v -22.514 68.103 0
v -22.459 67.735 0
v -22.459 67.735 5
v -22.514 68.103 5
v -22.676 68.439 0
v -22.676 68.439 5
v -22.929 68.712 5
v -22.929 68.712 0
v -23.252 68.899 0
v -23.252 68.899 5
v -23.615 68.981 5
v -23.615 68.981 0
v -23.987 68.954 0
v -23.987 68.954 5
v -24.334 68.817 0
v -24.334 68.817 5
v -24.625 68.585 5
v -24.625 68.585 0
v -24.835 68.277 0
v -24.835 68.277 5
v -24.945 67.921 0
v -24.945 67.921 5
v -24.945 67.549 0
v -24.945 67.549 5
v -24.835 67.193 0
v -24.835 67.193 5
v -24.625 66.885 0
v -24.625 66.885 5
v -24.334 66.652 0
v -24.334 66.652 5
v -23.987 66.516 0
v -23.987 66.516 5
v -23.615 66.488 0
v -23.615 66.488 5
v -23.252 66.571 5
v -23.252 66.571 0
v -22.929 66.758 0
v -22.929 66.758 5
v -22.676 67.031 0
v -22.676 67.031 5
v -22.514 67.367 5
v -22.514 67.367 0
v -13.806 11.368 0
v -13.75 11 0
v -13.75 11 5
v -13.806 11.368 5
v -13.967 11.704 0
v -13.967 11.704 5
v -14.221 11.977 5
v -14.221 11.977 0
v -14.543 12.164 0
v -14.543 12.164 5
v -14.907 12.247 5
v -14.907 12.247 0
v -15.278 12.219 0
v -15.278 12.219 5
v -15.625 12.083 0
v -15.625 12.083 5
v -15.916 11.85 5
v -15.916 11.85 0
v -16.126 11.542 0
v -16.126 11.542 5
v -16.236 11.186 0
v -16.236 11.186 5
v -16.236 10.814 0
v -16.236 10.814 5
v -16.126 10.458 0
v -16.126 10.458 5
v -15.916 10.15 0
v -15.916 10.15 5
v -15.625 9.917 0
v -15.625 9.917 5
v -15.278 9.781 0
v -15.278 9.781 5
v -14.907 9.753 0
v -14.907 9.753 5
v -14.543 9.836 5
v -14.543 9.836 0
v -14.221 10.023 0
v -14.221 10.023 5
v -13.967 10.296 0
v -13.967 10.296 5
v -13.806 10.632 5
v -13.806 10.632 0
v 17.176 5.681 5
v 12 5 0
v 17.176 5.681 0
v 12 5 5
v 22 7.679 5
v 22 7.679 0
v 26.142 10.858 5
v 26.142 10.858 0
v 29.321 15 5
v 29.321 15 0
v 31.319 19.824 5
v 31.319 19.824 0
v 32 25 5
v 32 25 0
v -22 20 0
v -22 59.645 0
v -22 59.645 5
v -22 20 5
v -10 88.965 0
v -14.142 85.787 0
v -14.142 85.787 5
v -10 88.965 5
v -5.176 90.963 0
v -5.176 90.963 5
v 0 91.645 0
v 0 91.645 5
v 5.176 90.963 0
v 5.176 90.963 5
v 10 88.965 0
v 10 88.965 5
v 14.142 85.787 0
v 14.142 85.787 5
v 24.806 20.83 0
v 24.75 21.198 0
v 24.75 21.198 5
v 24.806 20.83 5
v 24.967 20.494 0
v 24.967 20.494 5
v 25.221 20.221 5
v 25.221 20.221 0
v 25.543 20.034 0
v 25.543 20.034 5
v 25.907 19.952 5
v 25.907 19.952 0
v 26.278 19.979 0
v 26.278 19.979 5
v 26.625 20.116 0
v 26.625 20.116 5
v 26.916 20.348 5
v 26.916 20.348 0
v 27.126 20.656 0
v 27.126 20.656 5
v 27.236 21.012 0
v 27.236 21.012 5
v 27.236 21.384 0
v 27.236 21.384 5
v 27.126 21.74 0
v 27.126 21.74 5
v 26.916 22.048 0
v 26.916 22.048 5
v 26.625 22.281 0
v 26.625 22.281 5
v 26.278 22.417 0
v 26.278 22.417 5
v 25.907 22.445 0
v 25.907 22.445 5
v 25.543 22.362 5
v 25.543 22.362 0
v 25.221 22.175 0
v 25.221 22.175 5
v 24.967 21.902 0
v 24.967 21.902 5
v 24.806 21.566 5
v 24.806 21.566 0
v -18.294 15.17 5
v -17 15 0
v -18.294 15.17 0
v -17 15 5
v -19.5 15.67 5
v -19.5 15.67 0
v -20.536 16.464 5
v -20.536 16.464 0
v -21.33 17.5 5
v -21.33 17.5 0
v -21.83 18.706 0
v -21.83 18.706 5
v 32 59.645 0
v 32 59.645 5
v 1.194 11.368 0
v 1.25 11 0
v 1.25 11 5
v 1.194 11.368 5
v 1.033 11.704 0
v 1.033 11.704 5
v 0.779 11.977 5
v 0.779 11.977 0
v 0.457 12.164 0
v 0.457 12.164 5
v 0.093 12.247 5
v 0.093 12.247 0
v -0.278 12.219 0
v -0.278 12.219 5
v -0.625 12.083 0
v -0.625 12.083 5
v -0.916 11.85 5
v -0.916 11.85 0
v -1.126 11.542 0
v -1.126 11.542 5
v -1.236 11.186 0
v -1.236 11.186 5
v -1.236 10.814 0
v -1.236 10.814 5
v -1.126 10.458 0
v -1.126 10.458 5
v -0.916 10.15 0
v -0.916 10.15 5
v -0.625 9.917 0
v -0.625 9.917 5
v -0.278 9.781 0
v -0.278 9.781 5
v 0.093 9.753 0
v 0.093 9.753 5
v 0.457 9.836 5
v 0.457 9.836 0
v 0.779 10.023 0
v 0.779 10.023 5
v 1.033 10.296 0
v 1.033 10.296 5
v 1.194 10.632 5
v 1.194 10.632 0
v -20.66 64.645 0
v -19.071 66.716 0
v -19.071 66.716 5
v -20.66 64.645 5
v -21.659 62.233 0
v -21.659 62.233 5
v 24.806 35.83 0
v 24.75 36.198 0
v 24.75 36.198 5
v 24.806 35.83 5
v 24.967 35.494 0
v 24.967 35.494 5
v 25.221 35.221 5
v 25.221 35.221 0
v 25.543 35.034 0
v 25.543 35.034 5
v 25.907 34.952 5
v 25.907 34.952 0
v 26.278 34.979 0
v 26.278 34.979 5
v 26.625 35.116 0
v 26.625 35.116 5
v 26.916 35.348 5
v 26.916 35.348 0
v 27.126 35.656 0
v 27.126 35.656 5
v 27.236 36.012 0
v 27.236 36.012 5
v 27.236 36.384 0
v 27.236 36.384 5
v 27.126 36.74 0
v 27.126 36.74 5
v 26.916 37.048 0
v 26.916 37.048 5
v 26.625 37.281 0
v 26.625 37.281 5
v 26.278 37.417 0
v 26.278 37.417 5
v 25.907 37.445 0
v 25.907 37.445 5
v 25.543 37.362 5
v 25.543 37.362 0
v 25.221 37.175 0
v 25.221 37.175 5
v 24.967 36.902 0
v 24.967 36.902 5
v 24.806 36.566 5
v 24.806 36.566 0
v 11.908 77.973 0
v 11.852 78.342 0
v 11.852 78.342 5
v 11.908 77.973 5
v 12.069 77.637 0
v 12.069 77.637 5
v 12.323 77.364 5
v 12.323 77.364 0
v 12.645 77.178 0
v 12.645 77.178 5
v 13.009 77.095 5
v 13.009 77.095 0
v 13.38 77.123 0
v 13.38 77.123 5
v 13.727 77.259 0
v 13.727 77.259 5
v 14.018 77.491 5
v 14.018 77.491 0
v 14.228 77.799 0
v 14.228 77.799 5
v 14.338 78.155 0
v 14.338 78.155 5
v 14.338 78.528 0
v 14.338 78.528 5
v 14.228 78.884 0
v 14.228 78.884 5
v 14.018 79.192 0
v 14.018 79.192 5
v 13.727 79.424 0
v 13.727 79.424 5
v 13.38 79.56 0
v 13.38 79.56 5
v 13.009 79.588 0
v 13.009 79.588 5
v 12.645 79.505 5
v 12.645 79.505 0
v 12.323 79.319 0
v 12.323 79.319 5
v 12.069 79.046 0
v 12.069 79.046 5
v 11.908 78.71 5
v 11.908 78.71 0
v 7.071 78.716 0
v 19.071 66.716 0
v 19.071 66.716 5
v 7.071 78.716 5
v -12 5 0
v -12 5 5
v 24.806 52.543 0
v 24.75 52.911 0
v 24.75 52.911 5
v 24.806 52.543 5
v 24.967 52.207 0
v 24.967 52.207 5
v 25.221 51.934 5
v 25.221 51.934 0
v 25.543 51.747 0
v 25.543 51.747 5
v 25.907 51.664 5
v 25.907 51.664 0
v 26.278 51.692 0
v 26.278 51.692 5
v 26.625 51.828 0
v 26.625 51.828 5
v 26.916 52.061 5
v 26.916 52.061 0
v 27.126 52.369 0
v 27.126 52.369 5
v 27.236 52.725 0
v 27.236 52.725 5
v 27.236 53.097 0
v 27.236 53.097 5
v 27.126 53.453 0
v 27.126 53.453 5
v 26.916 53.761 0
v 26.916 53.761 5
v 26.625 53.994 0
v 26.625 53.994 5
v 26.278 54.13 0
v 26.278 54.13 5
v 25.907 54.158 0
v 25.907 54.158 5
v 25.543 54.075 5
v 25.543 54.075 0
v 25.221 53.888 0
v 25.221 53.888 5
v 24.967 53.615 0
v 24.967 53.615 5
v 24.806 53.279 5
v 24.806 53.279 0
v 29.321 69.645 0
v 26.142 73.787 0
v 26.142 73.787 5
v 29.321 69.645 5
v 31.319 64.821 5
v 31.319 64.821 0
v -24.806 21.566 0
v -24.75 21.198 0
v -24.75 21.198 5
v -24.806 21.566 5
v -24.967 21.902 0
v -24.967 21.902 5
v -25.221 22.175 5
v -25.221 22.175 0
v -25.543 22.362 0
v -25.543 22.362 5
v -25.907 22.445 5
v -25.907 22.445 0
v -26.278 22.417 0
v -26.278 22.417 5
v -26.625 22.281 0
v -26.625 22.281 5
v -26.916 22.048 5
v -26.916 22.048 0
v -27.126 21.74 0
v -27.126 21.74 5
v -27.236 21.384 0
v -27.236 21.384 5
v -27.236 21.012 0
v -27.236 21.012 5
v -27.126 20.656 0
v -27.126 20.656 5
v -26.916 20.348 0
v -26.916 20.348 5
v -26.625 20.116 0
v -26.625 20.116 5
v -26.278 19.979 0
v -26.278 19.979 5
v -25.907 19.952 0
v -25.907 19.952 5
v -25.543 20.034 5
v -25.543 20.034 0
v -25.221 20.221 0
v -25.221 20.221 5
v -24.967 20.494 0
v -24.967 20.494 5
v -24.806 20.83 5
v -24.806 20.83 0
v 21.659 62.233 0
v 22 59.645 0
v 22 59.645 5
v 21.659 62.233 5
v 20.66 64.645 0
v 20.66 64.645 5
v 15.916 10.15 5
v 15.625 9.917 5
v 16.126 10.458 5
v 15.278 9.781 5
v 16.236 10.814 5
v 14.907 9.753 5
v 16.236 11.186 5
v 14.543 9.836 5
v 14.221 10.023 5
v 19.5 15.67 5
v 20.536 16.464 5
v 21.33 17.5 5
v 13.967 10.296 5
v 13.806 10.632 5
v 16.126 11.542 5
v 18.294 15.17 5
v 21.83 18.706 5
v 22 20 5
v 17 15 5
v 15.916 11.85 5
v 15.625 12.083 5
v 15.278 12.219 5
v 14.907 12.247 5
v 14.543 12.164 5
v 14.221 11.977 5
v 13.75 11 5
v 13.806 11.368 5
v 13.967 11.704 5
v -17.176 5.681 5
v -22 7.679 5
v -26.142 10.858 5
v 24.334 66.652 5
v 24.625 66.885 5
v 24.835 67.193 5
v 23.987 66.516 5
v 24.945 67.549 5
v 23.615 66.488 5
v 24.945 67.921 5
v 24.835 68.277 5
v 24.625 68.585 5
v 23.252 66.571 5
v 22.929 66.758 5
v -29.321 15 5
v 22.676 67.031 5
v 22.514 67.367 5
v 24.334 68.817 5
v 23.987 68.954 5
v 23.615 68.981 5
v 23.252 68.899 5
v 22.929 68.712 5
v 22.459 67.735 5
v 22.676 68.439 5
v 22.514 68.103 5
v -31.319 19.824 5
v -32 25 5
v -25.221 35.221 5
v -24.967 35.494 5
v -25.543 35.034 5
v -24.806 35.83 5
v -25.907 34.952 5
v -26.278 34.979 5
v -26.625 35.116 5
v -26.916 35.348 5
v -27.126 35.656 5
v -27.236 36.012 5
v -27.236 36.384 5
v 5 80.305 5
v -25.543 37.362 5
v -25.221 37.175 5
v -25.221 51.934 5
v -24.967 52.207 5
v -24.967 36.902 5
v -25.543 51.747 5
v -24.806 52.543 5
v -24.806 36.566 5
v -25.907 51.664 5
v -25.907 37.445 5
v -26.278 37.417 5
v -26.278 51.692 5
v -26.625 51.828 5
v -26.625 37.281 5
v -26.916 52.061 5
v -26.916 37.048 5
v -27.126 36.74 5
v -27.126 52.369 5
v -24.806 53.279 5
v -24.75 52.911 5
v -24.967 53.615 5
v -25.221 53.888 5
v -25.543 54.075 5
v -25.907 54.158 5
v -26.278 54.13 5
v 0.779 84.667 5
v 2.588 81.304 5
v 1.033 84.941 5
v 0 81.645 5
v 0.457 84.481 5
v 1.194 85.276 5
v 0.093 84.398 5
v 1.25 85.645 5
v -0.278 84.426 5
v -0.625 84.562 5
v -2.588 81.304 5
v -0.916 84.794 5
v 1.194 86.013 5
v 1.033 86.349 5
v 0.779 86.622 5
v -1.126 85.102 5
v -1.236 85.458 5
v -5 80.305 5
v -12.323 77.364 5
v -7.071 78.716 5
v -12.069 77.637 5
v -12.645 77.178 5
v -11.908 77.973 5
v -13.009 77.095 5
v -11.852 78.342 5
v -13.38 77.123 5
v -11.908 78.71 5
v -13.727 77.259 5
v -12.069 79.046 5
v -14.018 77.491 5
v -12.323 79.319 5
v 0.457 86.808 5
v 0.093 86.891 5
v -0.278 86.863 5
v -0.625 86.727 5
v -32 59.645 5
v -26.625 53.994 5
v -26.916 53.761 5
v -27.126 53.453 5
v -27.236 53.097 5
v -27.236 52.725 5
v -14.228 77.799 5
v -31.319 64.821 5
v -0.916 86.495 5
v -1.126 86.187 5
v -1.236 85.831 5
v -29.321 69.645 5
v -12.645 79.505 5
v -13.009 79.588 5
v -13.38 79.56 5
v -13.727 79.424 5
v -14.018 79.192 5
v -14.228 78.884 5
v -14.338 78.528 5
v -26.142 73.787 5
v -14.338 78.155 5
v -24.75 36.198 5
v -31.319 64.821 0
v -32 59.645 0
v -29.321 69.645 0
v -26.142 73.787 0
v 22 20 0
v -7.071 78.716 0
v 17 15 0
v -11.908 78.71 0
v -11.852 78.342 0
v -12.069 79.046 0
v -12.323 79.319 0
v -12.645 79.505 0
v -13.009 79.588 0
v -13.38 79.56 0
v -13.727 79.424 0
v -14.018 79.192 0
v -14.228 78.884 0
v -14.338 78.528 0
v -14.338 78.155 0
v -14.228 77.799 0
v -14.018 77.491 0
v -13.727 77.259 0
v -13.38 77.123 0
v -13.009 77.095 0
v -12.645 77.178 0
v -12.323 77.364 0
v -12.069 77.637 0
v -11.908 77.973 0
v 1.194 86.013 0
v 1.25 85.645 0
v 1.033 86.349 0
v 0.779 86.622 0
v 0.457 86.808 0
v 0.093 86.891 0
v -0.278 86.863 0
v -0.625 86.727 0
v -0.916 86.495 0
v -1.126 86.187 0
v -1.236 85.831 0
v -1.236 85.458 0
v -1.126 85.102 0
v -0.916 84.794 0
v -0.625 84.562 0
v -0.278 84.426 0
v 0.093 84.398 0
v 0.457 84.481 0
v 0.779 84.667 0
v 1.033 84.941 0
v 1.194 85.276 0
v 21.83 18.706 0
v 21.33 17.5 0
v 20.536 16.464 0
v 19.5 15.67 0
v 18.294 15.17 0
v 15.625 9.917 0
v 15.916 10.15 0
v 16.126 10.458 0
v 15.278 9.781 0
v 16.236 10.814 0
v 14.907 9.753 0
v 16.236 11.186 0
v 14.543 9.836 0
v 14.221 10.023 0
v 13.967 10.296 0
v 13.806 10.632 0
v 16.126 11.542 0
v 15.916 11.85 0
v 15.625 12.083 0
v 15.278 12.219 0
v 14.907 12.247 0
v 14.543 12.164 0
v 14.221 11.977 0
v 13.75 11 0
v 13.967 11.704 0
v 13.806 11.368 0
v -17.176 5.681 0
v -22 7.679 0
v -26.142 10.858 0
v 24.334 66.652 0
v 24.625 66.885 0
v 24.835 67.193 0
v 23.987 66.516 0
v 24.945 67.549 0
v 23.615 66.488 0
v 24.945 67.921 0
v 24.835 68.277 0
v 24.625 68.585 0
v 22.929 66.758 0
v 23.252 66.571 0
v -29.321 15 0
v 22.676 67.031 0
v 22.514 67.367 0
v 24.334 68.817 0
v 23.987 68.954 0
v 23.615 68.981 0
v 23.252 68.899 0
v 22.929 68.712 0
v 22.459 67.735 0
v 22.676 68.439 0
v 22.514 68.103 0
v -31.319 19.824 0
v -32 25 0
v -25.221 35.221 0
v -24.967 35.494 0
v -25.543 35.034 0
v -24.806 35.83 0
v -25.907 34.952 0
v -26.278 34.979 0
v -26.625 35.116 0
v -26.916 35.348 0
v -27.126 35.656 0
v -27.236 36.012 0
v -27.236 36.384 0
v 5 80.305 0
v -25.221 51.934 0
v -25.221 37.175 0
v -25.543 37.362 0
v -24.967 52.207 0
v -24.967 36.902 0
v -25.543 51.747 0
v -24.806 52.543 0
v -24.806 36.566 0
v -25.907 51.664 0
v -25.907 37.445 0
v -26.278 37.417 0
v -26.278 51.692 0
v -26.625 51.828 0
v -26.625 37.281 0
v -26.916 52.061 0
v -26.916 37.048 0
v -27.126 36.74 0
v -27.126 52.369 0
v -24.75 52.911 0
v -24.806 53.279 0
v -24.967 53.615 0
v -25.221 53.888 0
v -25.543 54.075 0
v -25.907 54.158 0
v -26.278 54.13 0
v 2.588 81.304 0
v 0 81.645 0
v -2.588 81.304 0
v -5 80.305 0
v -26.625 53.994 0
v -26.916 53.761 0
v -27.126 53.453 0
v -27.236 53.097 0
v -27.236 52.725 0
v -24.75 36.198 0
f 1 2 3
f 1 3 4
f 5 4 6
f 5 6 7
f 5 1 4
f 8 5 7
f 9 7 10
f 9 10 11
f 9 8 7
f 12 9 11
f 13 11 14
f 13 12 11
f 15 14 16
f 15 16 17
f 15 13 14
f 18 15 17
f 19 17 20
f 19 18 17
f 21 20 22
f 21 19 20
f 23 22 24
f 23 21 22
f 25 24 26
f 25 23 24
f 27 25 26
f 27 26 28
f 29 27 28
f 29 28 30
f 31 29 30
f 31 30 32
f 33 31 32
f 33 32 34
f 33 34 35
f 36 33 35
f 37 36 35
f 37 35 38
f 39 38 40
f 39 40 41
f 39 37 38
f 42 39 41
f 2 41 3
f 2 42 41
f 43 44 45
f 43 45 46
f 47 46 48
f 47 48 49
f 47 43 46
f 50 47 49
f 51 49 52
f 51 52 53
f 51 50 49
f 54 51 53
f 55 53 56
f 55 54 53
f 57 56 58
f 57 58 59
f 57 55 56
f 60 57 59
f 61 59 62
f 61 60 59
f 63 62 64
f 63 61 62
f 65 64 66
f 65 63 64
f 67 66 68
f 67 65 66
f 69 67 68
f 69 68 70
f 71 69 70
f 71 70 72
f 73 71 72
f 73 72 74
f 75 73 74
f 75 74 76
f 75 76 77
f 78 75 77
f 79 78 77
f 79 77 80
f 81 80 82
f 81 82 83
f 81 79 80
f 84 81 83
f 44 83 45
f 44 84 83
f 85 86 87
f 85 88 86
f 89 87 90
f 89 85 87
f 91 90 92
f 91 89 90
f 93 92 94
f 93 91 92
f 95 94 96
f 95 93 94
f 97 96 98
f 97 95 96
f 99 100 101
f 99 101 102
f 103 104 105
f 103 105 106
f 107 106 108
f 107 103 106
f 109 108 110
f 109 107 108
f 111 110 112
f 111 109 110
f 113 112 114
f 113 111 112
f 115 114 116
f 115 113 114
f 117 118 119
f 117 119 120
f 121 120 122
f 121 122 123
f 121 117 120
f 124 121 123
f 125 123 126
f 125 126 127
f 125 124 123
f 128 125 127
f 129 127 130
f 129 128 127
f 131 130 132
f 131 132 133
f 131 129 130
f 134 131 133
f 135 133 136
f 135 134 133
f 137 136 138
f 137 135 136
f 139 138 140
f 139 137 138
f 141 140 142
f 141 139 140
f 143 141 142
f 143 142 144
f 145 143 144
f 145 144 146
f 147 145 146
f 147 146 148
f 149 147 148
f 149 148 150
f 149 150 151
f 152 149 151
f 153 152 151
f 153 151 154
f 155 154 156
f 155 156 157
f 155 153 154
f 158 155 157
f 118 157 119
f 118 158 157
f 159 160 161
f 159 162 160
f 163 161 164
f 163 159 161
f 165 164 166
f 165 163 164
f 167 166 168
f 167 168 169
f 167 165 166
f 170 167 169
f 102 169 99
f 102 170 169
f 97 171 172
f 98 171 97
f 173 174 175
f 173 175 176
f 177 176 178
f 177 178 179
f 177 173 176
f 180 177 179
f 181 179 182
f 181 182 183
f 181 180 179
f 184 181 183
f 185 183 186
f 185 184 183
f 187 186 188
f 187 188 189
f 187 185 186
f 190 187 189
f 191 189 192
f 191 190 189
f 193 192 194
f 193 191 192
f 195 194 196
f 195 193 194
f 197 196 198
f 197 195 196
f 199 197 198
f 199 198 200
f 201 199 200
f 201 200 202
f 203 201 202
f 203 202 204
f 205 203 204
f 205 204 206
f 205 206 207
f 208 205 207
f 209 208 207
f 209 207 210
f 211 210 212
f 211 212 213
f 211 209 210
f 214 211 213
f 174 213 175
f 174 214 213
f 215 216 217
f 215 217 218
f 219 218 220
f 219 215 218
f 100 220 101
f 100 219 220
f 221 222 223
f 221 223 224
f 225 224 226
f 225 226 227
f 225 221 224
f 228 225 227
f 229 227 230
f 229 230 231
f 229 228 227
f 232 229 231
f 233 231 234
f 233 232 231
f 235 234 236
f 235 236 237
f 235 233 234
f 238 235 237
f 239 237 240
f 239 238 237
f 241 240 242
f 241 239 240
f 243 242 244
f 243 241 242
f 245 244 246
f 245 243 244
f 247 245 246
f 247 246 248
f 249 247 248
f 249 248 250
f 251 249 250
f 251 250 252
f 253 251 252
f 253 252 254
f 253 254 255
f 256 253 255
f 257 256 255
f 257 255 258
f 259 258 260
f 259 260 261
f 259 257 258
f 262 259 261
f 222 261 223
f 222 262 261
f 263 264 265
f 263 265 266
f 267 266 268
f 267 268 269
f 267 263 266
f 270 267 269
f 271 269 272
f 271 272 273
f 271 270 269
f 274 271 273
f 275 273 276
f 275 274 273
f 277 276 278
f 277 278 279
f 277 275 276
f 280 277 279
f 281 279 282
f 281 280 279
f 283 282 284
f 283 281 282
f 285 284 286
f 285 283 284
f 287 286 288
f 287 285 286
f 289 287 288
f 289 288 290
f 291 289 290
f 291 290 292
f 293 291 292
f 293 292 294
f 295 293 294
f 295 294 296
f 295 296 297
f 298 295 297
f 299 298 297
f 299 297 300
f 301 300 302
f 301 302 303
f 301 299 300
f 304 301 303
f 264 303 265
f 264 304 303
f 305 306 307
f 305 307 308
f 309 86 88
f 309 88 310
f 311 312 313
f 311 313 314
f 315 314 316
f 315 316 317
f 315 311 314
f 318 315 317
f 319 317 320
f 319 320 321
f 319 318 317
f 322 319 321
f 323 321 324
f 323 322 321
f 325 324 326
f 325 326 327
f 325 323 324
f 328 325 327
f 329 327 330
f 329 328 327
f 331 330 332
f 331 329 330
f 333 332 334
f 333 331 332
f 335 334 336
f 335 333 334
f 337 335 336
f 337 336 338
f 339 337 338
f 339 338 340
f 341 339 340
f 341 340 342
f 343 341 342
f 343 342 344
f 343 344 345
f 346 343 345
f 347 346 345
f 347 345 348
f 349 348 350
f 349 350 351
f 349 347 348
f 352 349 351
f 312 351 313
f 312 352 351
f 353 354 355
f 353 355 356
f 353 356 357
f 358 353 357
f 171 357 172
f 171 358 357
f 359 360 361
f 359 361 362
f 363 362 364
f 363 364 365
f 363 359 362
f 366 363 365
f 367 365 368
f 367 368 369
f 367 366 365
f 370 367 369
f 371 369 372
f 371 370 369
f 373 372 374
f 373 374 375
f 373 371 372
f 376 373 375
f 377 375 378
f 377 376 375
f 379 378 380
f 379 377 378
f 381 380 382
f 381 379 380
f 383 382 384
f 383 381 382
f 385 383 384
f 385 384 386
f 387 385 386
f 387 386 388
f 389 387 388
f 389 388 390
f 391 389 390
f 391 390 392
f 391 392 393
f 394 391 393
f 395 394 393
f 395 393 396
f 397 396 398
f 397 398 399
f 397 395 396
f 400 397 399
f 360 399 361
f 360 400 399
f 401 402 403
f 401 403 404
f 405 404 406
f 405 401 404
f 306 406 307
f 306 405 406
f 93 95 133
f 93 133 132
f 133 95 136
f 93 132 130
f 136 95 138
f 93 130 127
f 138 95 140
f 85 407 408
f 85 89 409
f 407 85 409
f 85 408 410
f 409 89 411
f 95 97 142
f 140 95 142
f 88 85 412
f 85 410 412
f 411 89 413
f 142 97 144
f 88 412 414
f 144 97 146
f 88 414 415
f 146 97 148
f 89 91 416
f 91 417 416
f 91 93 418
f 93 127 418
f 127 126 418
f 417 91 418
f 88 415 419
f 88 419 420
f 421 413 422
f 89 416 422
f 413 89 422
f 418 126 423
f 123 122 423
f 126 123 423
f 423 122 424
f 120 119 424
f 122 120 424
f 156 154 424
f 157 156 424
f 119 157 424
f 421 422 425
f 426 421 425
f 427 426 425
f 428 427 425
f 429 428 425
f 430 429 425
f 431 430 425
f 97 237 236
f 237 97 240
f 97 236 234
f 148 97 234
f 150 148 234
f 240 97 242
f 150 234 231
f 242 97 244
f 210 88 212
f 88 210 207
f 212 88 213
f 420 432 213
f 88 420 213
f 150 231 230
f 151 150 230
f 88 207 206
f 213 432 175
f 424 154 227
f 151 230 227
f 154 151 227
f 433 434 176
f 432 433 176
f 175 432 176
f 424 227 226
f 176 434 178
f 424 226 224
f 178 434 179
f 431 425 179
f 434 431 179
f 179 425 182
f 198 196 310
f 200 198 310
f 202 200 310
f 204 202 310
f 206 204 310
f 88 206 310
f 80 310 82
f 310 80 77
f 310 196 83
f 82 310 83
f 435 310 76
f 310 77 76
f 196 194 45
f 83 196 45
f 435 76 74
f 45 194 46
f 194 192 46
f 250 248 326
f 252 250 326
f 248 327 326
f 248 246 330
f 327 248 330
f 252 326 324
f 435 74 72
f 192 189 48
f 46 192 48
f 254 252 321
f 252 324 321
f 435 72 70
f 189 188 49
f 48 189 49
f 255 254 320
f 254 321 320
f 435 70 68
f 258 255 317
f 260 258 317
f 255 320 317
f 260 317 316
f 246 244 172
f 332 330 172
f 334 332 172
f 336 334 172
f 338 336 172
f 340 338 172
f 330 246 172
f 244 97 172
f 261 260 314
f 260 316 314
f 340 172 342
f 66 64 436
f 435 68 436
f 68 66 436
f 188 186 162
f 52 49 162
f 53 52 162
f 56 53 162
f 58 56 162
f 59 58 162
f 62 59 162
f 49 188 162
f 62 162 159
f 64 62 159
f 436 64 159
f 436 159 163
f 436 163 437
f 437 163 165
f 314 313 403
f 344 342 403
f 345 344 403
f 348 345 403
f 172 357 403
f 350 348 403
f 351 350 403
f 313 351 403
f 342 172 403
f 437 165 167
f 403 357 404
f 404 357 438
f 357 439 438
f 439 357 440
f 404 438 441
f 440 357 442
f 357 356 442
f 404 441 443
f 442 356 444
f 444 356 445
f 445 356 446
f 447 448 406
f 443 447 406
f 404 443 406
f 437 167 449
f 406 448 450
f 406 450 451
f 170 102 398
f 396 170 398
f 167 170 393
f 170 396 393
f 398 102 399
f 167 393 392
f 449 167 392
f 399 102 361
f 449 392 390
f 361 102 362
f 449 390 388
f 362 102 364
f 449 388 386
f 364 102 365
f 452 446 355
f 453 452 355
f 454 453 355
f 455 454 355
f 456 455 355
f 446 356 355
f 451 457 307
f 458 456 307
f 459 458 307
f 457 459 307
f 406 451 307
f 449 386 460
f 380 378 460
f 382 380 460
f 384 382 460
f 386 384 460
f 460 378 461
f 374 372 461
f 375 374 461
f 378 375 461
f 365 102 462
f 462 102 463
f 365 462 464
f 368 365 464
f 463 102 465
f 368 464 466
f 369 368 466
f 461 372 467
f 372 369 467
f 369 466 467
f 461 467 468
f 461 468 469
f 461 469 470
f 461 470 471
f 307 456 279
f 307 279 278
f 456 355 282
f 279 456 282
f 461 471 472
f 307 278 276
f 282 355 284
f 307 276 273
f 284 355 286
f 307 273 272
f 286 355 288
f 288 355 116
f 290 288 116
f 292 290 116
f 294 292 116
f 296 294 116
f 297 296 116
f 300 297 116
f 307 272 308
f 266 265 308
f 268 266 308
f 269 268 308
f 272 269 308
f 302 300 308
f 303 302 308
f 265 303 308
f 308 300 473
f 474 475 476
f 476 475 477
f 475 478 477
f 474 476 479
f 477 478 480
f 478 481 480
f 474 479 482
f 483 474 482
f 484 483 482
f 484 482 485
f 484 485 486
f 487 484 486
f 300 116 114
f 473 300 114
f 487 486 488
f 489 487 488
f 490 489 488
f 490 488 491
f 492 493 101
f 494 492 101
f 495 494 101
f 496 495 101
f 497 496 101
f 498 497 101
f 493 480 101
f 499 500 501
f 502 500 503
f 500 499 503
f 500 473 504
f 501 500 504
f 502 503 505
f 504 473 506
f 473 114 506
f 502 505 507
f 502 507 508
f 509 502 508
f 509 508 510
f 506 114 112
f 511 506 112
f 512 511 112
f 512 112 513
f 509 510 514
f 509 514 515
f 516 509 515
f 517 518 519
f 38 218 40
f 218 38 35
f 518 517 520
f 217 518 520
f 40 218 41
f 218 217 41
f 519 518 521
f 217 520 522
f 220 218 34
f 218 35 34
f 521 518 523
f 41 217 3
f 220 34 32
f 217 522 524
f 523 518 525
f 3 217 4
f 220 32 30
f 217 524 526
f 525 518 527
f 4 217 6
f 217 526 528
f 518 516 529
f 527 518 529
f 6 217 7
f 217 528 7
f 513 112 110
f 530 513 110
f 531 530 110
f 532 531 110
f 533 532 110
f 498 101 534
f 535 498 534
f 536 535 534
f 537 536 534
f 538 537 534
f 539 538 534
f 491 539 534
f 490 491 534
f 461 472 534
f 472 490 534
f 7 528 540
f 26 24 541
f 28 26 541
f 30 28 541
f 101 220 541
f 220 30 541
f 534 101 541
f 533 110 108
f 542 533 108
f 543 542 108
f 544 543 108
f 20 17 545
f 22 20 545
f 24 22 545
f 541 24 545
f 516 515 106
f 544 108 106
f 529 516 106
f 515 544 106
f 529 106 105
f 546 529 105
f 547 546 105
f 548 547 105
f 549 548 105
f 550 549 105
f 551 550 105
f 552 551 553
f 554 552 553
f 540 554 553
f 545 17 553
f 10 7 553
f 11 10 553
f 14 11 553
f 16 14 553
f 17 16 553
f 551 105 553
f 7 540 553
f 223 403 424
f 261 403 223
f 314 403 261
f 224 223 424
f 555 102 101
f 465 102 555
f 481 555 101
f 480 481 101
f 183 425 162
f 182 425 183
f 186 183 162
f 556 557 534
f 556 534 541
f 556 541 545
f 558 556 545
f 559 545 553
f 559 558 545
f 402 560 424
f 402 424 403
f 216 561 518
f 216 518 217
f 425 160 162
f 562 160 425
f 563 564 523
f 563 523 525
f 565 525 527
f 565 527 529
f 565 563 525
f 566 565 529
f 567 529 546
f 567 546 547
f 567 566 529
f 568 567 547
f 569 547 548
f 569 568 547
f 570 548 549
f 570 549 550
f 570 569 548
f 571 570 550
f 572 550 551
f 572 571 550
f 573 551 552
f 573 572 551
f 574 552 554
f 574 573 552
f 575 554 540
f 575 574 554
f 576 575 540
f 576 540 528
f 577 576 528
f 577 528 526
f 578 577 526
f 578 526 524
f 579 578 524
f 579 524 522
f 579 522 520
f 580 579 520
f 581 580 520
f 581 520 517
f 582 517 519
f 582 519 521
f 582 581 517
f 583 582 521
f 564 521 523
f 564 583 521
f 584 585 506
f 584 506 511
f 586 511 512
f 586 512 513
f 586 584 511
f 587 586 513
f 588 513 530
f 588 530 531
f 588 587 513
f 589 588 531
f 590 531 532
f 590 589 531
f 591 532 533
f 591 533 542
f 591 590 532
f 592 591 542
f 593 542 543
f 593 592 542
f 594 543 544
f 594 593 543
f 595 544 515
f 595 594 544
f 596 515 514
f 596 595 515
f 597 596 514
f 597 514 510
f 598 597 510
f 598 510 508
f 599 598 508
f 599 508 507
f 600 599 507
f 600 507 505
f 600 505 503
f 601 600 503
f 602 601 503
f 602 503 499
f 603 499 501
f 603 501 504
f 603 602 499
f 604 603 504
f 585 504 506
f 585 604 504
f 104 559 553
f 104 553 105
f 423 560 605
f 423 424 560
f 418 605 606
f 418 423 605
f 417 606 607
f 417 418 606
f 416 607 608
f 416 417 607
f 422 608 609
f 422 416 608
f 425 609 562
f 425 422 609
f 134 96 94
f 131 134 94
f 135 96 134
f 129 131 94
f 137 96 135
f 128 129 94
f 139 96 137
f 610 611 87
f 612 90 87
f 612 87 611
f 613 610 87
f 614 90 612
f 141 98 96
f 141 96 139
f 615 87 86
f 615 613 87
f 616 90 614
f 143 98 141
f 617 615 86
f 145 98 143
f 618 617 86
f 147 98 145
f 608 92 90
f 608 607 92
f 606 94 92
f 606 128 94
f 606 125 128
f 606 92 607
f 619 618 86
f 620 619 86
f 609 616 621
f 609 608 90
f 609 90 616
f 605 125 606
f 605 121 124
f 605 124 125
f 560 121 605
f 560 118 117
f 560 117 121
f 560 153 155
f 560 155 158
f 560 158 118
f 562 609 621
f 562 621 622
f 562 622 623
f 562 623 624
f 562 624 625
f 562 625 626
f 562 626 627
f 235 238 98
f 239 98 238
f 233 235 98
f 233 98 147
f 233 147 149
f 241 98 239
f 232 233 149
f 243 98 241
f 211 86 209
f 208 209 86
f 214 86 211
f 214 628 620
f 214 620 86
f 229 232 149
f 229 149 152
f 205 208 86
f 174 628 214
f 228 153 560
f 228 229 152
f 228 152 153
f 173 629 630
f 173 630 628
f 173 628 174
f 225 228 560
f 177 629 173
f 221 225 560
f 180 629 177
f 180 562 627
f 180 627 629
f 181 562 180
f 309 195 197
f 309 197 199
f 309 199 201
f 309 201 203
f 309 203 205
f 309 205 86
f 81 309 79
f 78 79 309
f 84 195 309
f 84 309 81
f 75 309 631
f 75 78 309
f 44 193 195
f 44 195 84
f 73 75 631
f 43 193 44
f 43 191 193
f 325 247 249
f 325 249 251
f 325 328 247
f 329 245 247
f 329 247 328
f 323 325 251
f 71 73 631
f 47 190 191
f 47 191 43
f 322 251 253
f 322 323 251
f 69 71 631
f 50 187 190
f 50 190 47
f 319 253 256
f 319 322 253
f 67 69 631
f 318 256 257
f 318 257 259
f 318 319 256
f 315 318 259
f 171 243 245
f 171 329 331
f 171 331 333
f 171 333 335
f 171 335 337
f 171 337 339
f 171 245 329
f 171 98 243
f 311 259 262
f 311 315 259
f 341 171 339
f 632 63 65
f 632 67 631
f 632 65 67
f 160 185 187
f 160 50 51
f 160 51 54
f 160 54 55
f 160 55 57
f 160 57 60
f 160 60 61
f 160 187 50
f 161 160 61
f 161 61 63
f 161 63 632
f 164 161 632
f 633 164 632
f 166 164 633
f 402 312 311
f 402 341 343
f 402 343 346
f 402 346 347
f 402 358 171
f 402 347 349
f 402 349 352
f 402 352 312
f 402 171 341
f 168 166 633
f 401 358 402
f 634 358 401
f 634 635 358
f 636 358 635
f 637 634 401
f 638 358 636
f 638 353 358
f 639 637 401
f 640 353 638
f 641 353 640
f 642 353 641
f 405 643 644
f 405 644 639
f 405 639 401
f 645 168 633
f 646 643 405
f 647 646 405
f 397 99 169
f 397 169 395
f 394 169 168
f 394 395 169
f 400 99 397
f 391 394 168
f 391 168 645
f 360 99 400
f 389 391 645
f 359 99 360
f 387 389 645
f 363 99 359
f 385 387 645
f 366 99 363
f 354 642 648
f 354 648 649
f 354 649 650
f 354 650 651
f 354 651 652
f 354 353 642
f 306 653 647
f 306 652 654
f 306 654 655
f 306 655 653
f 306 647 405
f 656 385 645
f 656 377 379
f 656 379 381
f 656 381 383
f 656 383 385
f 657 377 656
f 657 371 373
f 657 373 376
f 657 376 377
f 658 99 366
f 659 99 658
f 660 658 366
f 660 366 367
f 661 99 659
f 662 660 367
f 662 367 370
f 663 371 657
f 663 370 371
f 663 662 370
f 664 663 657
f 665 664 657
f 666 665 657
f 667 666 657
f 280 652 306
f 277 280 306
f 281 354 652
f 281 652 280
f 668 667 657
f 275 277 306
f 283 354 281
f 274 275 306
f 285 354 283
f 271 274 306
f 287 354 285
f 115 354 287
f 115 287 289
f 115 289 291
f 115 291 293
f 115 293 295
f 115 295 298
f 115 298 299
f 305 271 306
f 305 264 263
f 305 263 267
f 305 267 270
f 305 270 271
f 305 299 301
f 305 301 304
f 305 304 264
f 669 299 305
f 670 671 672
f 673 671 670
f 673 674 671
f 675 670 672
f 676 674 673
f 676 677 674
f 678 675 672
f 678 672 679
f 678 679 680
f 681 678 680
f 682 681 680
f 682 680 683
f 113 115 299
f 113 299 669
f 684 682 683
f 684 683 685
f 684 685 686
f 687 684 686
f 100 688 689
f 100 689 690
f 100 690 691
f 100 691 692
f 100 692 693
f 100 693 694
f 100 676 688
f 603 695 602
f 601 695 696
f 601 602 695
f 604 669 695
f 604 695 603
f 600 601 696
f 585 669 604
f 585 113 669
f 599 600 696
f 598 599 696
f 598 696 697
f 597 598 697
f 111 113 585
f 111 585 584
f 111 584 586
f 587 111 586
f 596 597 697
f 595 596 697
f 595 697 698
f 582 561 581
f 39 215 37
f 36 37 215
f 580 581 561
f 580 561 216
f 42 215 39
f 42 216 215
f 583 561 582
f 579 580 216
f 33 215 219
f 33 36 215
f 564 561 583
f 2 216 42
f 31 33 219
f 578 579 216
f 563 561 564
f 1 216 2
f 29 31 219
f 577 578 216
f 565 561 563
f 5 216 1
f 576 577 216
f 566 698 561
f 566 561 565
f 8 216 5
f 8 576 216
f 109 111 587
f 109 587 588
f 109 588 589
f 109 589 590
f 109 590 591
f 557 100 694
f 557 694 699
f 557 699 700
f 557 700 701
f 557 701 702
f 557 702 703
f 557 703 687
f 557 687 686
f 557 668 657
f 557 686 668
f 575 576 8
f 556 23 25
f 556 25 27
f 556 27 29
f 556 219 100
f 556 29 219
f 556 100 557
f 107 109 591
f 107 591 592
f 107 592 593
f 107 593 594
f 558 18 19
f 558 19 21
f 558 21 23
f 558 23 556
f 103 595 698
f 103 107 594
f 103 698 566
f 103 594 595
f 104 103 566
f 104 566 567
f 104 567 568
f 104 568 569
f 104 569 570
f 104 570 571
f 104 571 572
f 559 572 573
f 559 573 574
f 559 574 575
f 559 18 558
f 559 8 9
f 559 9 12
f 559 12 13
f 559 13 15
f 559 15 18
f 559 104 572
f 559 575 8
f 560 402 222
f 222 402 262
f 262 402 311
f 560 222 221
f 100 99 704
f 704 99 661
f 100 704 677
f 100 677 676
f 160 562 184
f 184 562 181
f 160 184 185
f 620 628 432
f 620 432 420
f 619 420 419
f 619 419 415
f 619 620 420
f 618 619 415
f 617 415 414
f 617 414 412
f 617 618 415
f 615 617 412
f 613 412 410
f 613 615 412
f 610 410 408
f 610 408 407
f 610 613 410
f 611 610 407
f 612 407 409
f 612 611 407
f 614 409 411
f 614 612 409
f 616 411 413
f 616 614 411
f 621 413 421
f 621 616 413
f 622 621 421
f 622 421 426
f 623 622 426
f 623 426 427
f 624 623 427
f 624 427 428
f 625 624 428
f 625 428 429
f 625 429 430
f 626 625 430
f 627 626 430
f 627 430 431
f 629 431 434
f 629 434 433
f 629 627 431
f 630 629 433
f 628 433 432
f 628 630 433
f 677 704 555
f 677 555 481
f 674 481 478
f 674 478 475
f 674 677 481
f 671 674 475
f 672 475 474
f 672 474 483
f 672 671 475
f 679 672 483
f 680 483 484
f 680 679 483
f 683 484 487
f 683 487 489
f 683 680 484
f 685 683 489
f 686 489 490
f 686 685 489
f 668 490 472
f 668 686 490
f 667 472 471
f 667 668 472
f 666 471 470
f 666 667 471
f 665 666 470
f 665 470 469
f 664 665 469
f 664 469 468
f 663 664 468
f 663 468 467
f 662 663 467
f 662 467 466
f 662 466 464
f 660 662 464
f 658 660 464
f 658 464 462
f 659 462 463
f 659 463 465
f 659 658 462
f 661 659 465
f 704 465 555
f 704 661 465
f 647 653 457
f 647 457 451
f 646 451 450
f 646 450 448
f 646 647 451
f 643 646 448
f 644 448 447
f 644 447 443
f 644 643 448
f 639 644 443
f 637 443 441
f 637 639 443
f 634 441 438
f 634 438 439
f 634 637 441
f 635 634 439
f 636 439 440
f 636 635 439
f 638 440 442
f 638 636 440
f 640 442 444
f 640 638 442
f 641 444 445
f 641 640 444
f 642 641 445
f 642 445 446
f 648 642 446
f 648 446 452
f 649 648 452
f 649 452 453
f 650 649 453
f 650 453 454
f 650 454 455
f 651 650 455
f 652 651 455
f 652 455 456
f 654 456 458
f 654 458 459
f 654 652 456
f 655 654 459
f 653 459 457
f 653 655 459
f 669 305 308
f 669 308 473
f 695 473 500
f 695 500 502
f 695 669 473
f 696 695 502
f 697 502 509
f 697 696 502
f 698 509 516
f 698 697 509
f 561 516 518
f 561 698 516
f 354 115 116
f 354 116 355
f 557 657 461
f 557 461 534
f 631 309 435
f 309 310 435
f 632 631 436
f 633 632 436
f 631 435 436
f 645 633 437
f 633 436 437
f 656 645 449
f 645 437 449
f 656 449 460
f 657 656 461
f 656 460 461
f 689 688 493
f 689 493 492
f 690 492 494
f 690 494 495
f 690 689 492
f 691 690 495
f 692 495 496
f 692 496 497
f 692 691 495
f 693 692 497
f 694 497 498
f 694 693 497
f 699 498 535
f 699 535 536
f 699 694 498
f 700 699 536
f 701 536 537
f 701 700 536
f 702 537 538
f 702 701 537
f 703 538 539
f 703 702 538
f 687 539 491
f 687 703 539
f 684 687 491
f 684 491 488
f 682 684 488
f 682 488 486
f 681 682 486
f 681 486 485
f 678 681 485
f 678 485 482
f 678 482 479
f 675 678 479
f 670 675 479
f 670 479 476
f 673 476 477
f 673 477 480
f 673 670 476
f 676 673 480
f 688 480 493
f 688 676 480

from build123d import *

# Parameters (mm, degrees)
SKETCH1_R           = 1.25
BOSS_EXTRUDE1_DEPTH = 5
FILLET1_R           = 20
FILLET2_R           = 5


with BuildPart() as part:
    # Sketch1 → Boss-Extrude1 (new body)
    with BuildSketch(Plane.XY):
        with BuildLine():
            Line((32, 5), (-32, 5))
            Line((-32, 5), (-32, 59.644660941))
            ThreePointArc((-32, 59.644660941), (-30.47759065, 67.298329588), (-26.142135624, 73.786796564))
            Line((-26.142135624, 73.786796564), (-14.142135624, 85.786796564))
            ThreePointArc((-14.142135624, 85.786796564), (0, 91.644660941), (14.142135624, 85.786796564))
            Line((14.142135624, 85.786796564), (26.142135624, 73.786796564))
            ThreePointArc((26.142135624, 73.786796564), (30.47759065, 67.298329588), (32, 59.644660941))
            Line((32, 59.644660941), (32, 5))
        make_face()
        with Locations((0, 85.644660941)):
            Circle(SKETCH1_R, mode=Mode.SUBTRACT)
        with Locations((-13.102089171, 78.341561643)):
            Circle(SKETCH1_R, mode=Mode.SUBTRACT)
        with Locations((-23.708690889, 67.734959925)):
            Circle(SKETCH1_R, mode=Mode.SUBTRACT)
        with Locations((-26, 52.910996131)):
            Circle(SKETCH1_R, mode=Mode.SUBTRACT)
        with Locations((-26, 36.198039027)):
            Circle(SKETCH1_R, mode=Mode.SUBTRACT)
        with Locations((-26, 21.198039027)):
            Circle(SKETCH1_R, mode=Mode.SUBTRACT)
        with Locations((0, 11)):
            Circle(SKETCH1_R, mode=Mode.SUBTRACT)
        with Locations((-15, 11)):
            Circle(SKETCH1_R, mode=Mode.SUBTRACT)
        with Locations(Location((13.102089171, 78.341561643, 0), (0, 0, 180))):
            Circle(SKETCH1_R, mode=Mode.SUBTRACT)
        with Locations(Location((23.708690889, 67.734959925, 0), (0, 0, 180))):
            Circle(SKETCH1_R, mode=Mode.SUBTRACT)
        with Locations(Location((26, 52.910996131, 0), (0, 0, 180))):
            Circle(SKETCH1_R, mode=Mode.SUBTRACT)
        with Locations(Location((26, 36.198039027, 0), (0, 0, 180))):
            Circle(SKETCH1_R, mode=Mode.SUBTRACT)
        with Locations(Location((26, 21.198039027, 0), (0, 0, 180))):
            Circle(SKETCH1_R, mode=Mode.SUBTRACT)
        with Locations(Location((15, 11, 0), (0, 0, 180))):
            Circle(SKETCH1_R, mode=Mode.SUBTRACT)
        with BuildLine():
            Line((-22, 59.644660941), (-22, 15))
            Line((-22, 15), (22, 15))
            Line((22, 15), (22, 59.644660941))
            ThreePointArc((22, 59.644660941), (21.238795325, 63.471495264), (19.071067812, 66.715728753))
            Line((19.071067812, 66.715728753), (7.071067812, 78.715728753))
            ThreePointArc((7.071067812, 78.715728753), (0, 81.644660941), (-7.071067812, 78.715728753))
            Line((-7.071067812, 78.715728753), (-19.071067812, 66.715728753))
            ThreePointArc((-19.071067812, 66.715728753), (-21.238795325, 63.471495264), (-22, 59.644660941))
        make_face(mode=Mode.SUBTRACT)
    extrude(amount=BOSS_EXTRUDE1_DEPTH)

    # Fillet1
    fillet1_edges = [part.edges().sort_by_distance(p)[0] for p in [
        (32, 5, 2.5),
        (-32, 5, 2.5),
    ]]
    fillet(fillet1_edges, radius=FILLET1_R)

    # Fillet2
    fillet2_edges = [part.edges().sort_by_distance(p)[0] for p in [
        (22, 15, 2.5),
        (-22, 15, 2.5),
    ]]
    fillet(fillet2_edges, radius=FILLET2_R)


solid = part.part
